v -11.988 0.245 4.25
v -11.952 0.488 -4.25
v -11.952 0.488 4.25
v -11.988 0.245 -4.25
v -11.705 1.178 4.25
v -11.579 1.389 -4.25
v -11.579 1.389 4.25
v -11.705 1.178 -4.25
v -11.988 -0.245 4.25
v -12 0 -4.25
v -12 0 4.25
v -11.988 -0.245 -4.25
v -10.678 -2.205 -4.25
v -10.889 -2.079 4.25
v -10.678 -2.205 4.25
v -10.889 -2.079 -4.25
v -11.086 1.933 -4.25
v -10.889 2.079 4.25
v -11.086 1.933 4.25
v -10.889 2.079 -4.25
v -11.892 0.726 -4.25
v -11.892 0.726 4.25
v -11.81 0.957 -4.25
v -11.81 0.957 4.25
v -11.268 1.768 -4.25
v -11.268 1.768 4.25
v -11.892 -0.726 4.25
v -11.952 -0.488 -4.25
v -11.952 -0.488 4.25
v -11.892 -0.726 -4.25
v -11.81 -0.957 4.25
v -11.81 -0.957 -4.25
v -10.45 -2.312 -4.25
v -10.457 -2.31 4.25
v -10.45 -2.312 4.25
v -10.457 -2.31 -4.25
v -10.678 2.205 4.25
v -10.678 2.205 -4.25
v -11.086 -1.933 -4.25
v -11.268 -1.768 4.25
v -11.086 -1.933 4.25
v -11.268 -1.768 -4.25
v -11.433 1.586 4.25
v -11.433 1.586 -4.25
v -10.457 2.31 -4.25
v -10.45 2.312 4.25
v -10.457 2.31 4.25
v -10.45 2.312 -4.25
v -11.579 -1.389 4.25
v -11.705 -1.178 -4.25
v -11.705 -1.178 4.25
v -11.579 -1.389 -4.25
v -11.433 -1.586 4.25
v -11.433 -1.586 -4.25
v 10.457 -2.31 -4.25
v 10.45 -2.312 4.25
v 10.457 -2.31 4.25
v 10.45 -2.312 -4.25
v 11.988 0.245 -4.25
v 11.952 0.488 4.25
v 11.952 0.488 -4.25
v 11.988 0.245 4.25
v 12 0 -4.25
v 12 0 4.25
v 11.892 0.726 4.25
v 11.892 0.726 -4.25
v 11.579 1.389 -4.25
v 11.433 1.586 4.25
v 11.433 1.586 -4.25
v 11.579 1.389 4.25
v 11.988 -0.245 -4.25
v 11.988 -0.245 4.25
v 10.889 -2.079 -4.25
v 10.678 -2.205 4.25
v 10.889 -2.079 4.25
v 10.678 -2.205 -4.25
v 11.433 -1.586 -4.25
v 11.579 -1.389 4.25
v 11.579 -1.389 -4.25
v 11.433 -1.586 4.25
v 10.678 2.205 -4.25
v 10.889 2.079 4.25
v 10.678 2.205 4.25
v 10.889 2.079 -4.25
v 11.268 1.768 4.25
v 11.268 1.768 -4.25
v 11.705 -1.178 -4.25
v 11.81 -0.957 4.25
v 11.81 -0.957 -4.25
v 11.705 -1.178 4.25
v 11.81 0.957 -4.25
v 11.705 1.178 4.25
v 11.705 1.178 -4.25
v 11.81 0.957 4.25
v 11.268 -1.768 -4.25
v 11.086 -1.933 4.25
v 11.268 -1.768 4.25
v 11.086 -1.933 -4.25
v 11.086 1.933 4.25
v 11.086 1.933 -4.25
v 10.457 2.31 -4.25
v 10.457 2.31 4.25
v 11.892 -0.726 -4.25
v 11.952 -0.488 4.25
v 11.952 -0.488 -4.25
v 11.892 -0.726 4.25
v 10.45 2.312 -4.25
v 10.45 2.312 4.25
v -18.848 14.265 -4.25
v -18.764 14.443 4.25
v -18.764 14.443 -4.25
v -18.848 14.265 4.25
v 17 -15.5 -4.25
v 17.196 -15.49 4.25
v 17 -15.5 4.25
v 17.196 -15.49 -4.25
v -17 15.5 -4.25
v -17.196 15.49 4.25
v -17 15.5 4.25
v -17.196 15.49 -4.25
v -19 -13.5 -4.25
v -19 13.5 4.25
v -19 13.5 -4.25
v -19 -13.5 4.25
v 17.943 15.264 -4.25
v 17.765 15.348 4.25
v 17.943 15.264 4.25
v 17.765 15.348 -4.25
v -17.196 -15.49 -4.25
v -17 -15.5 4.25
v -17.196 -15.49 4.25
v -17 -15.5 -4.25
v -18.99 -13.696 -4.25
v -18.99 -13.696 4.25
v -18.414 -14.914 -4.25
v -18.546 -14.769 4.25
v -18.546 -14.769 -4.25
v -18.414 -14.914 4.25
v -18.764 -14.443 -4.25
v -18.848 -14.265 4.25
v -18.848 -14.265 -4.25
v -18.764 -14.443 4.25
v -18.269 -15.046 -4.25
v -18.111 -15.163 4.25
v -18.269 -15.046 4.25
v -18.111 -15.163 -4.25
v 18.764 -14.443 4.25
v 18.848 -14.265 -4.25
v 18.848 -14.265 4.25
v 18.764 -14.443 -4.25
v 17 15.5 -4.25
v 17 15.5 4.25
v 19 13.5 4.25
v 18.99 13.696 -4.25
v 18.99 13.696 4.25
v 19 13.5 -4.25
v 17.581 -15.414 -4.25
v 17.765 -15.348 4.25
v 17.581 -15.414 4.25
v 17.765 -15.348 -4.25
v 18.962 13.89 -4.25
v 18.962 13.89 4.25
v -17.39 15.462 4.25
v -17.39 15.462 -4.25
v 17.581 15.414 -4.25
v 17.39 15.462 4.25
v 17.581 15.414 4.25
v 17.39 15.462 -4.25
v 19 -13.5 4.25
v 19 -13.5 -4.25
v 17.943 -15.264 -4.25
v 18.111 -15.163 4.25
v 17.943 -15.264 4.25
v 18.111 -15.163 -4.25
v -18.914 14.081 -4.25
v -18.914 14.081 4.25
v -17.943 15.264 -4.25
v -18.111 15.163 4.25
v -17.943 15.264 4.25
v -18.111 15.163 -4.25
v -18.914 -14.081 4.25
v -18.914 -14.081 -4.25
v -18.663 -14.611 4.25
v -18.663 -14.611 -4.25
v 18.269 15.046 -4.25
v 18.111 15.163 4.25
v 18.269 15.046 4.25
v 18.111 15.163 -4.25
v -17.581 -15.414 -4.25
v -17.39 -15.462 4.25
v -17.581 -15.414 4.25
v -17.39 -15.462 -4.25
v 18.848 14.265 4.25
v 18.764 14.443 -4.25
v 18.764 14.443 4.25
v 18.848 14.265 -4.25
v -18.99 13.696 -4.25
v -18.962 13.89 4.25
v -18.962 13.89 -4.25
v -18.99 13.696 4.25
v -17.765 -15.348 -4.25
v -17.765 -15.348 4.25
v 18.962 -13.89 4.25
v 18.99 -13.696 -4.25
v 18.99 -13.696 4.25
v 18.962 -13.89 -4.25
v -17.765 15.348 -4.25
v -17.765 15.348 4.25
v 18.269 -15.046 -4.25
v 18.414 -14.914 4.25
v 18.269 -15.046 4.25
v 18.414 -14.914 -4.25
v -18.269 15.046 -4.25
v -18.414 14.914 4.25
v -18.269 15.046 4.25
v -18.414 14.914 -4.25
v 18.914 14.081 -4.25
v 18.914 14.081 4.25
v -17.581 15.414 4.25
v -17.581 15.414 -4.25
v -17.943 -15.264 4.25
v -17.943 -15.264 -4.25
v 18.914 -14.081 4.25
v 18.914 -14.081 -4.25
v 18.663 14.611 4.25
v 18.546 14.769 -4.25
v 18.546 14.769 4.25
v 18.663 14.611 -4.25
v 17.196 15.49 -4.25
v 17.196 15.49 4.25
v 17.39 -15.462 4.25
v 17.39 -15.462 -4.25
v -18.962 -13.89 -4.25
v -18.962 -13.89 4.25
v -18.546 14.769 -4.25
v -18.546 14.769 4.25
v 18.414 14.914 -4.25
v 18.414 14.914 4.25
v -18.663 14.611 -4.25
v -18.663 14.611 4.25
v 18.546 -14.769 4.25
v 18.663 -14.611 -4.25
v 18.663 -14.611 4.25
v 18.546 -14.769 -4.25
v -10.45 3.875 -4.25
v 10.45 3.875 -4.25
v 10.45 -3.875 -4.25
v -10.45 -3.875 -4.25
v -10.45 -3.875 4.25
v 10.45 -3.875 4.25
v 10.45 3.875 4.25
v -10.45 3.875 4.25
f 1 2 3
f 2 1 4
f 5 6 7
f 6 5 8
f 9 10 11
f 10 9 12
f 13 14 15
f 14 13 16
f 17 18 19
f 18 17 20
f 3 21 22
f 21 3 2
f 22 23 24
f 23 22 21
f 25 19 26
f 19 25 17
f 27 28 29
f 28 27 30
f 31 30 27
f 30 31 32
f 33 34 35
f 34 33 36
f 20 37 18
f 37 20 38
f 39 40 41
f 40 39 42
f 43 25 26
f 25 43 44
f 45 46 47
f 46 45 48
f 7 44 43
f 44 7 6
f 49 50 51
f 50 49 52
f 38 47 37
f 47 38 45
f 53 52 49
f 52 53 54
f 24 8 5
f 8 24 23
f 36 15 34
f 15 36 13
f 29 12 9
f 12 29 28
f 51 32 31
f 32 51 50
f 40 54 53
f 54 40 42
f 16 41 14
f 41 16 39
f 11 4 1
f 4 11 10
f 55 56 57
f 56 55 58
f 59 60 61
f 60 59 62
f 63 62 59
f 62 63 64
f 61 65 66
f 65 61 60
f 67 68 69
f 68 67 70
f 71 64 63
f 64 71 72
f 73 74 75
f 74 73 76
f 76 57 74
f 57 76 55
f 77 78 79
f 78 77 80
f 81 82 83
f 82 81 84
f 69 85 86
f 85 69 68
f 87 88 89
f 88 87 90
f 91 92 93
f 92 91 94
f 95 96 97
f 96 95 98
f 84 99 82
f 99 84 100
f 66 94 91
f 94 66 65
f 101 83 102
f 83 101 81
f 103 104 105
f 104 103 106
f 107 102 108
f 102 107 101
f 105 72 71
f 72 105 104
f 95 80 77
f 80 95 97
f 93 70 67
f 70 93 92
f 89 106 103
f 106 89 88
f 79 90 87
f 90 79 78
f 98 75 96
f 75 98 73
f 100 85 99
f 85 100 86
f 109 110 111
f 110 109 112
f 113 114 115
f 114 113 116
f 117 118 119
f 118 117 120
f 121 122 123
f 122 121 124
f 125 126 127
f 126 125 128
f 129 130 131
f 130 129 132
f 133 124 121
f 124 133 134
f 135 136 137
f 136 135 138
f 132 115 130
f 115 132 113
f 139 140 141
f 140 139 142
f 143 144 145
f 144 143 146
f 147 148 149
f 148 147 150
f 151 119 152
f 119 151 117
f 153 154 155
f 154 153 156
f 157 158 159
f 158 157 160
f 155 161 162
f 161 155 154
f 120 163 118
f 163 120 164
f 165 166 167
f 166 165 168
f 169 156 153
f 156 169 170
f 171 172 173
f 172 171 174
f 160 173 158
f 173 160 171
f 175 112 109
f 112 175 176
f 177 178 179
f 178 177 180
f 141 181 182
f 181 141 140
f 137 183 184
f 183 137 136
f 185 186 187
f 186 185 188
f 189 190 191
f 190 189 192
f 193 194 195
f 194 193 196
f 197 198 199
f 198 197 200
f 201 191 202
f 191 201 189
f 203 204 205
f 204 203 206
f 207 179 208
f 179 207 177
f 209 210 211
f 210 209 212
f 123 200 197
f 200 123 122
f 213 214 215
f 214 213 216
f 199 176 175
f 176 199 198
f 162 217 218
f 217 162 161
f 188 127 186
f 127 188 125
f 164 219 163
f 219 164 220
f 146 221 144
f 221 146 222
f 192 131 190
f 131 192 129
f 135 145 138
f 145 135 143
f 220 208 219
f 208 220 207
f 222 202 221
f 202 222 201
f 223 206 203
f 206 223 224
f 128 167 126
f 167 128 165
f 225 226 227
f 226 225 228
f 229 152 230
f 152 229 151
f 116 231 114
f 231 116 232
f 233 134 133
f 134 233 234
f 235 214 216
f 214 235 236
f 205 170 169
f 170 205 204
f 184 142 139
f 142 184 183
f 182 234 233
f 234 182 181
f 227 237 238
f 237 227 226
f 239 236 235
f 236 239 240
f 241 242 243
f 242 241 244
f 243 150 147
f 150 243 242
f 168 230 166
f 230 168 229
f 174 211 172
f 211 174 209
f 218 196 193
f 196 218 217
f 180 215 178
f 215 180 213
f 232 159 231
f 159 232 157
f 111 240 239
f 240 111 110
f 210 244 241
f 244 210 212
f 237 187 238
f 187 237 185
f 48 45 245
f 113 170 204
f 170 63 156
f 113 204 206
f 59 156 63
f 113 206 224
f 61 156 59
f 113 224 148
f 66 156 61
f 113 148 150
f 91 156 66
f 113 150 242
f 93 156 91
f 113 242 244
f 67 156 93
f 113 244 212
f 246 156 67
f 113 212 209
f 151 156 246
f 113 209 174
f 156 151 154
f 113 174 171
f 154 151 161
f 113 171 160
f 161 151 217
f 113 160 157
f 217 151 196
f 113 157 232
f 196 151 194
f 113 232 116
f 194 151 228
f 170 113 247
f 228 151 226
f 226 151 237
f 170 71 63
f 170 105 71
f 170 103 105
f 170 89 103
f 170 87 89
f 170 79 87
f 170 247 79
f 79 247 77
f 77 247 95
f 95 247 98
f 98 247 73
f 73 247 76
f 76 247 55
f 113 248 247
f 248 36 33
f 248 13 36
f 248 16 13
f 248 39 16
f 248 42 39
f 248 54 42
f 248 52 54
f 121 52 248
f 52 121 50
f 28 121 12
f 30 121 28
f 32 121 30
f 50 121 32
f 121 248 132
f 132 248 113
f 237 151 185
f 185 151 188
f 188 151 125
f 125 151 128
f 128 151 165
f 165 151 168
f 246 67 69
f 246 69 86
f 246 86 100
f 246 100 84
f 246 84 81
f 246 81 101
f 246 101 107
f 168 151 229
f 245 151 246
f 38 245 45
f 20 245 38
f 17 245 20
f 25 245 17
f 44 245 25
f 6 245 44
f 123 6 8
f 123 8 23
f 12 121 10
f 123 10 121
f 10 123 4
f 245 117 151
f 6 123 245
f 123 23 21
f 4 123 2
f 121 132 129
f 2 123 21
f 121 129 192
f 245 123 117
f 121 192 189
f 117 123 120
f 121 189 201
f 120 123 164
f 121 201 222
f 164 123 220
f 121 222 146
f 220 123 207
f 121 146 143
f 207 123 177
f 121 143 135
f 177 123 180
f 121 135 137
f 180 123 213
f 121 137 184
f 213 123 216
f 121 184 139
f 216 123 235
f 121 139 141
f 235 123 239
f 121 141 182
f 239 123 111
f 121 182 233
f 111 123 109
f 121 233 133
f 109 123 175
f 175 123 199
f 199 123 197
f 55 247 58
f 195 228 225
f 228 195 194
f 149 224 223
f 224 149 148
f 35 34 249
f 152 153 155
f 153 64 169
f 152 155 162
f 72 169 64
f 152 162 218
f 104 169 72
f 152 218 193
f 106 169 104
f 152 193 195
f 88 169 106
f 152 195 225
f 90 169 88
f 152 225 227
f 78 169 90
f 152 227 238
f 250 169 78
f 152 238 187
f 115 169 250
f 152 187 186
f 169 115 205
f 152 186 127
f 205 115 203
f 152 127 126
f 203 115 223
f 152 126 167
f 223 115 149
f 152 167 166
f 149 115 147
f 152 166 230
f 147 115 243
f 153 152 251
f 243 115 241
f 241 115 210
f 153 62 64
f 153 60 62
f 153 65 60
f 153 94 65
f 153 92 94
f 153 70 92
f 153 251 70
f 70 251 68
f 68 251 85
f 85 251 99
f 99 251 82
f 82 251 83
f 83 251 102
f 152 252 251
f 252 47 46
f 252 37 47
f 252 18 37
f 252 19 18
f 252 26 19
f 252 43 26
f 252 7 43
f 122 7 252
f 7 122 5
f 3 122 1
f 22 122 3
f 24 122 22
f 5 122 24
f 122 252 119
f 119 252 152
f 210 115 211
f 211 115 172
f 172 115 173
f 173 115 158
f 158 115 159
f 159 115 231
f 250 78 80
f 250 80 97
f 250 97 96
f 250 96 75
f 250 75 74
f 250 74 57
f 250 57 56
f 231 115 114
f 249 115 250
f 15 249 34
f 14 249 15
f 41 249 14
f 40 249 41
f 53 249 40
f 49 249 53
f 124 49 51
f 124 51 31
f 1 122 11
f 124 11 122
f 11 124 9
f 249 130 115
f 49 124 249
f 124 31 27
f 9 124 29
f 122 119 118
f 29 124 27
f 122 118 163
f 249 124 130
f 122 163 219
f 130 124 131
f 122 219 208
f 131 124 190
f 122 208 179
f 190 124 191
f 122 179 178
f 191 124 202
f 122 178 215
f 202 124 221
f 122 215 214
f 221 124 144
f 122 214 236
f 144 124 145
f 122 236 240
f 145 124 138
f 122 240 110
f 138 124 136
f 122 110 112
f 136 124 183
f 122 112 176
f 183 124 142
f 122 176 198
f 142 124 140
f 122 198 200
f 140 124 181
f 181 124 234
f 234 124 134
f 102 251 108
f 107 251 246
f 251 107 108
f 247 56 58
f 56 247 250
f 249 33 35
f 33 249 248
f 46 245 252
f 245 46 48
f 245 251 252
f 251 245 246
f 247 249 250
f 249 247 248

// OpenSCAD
$fn=64;

size = [38, 31, 8.5];

module extrusion_bracket(sz=[38,31,8.5], corner_r=2) {
    x = sz[0];
    y = sz[1];
    z = sz[2];

    difference() {
        // Main body with slightly rounded corners
        linear_extrude(height=z, center=true)
            offset(r=corner_r)
                offset(delta=-corner_r)
                    square([x, y], center=true);

        // Two mounting holes along the long axis
        for (sx = [-1, 1]) {
            translate([sx*(x*0.25), 0, 0])
                cylinder(h=z+2, d=5, center=true);
        }

        // Central relief slot
        translate([0, 0, 0])
            cube([x*0.55, y*0.25, z+2], center=true);
    }
}

extrusion_bracket(size, corner_r=2);
